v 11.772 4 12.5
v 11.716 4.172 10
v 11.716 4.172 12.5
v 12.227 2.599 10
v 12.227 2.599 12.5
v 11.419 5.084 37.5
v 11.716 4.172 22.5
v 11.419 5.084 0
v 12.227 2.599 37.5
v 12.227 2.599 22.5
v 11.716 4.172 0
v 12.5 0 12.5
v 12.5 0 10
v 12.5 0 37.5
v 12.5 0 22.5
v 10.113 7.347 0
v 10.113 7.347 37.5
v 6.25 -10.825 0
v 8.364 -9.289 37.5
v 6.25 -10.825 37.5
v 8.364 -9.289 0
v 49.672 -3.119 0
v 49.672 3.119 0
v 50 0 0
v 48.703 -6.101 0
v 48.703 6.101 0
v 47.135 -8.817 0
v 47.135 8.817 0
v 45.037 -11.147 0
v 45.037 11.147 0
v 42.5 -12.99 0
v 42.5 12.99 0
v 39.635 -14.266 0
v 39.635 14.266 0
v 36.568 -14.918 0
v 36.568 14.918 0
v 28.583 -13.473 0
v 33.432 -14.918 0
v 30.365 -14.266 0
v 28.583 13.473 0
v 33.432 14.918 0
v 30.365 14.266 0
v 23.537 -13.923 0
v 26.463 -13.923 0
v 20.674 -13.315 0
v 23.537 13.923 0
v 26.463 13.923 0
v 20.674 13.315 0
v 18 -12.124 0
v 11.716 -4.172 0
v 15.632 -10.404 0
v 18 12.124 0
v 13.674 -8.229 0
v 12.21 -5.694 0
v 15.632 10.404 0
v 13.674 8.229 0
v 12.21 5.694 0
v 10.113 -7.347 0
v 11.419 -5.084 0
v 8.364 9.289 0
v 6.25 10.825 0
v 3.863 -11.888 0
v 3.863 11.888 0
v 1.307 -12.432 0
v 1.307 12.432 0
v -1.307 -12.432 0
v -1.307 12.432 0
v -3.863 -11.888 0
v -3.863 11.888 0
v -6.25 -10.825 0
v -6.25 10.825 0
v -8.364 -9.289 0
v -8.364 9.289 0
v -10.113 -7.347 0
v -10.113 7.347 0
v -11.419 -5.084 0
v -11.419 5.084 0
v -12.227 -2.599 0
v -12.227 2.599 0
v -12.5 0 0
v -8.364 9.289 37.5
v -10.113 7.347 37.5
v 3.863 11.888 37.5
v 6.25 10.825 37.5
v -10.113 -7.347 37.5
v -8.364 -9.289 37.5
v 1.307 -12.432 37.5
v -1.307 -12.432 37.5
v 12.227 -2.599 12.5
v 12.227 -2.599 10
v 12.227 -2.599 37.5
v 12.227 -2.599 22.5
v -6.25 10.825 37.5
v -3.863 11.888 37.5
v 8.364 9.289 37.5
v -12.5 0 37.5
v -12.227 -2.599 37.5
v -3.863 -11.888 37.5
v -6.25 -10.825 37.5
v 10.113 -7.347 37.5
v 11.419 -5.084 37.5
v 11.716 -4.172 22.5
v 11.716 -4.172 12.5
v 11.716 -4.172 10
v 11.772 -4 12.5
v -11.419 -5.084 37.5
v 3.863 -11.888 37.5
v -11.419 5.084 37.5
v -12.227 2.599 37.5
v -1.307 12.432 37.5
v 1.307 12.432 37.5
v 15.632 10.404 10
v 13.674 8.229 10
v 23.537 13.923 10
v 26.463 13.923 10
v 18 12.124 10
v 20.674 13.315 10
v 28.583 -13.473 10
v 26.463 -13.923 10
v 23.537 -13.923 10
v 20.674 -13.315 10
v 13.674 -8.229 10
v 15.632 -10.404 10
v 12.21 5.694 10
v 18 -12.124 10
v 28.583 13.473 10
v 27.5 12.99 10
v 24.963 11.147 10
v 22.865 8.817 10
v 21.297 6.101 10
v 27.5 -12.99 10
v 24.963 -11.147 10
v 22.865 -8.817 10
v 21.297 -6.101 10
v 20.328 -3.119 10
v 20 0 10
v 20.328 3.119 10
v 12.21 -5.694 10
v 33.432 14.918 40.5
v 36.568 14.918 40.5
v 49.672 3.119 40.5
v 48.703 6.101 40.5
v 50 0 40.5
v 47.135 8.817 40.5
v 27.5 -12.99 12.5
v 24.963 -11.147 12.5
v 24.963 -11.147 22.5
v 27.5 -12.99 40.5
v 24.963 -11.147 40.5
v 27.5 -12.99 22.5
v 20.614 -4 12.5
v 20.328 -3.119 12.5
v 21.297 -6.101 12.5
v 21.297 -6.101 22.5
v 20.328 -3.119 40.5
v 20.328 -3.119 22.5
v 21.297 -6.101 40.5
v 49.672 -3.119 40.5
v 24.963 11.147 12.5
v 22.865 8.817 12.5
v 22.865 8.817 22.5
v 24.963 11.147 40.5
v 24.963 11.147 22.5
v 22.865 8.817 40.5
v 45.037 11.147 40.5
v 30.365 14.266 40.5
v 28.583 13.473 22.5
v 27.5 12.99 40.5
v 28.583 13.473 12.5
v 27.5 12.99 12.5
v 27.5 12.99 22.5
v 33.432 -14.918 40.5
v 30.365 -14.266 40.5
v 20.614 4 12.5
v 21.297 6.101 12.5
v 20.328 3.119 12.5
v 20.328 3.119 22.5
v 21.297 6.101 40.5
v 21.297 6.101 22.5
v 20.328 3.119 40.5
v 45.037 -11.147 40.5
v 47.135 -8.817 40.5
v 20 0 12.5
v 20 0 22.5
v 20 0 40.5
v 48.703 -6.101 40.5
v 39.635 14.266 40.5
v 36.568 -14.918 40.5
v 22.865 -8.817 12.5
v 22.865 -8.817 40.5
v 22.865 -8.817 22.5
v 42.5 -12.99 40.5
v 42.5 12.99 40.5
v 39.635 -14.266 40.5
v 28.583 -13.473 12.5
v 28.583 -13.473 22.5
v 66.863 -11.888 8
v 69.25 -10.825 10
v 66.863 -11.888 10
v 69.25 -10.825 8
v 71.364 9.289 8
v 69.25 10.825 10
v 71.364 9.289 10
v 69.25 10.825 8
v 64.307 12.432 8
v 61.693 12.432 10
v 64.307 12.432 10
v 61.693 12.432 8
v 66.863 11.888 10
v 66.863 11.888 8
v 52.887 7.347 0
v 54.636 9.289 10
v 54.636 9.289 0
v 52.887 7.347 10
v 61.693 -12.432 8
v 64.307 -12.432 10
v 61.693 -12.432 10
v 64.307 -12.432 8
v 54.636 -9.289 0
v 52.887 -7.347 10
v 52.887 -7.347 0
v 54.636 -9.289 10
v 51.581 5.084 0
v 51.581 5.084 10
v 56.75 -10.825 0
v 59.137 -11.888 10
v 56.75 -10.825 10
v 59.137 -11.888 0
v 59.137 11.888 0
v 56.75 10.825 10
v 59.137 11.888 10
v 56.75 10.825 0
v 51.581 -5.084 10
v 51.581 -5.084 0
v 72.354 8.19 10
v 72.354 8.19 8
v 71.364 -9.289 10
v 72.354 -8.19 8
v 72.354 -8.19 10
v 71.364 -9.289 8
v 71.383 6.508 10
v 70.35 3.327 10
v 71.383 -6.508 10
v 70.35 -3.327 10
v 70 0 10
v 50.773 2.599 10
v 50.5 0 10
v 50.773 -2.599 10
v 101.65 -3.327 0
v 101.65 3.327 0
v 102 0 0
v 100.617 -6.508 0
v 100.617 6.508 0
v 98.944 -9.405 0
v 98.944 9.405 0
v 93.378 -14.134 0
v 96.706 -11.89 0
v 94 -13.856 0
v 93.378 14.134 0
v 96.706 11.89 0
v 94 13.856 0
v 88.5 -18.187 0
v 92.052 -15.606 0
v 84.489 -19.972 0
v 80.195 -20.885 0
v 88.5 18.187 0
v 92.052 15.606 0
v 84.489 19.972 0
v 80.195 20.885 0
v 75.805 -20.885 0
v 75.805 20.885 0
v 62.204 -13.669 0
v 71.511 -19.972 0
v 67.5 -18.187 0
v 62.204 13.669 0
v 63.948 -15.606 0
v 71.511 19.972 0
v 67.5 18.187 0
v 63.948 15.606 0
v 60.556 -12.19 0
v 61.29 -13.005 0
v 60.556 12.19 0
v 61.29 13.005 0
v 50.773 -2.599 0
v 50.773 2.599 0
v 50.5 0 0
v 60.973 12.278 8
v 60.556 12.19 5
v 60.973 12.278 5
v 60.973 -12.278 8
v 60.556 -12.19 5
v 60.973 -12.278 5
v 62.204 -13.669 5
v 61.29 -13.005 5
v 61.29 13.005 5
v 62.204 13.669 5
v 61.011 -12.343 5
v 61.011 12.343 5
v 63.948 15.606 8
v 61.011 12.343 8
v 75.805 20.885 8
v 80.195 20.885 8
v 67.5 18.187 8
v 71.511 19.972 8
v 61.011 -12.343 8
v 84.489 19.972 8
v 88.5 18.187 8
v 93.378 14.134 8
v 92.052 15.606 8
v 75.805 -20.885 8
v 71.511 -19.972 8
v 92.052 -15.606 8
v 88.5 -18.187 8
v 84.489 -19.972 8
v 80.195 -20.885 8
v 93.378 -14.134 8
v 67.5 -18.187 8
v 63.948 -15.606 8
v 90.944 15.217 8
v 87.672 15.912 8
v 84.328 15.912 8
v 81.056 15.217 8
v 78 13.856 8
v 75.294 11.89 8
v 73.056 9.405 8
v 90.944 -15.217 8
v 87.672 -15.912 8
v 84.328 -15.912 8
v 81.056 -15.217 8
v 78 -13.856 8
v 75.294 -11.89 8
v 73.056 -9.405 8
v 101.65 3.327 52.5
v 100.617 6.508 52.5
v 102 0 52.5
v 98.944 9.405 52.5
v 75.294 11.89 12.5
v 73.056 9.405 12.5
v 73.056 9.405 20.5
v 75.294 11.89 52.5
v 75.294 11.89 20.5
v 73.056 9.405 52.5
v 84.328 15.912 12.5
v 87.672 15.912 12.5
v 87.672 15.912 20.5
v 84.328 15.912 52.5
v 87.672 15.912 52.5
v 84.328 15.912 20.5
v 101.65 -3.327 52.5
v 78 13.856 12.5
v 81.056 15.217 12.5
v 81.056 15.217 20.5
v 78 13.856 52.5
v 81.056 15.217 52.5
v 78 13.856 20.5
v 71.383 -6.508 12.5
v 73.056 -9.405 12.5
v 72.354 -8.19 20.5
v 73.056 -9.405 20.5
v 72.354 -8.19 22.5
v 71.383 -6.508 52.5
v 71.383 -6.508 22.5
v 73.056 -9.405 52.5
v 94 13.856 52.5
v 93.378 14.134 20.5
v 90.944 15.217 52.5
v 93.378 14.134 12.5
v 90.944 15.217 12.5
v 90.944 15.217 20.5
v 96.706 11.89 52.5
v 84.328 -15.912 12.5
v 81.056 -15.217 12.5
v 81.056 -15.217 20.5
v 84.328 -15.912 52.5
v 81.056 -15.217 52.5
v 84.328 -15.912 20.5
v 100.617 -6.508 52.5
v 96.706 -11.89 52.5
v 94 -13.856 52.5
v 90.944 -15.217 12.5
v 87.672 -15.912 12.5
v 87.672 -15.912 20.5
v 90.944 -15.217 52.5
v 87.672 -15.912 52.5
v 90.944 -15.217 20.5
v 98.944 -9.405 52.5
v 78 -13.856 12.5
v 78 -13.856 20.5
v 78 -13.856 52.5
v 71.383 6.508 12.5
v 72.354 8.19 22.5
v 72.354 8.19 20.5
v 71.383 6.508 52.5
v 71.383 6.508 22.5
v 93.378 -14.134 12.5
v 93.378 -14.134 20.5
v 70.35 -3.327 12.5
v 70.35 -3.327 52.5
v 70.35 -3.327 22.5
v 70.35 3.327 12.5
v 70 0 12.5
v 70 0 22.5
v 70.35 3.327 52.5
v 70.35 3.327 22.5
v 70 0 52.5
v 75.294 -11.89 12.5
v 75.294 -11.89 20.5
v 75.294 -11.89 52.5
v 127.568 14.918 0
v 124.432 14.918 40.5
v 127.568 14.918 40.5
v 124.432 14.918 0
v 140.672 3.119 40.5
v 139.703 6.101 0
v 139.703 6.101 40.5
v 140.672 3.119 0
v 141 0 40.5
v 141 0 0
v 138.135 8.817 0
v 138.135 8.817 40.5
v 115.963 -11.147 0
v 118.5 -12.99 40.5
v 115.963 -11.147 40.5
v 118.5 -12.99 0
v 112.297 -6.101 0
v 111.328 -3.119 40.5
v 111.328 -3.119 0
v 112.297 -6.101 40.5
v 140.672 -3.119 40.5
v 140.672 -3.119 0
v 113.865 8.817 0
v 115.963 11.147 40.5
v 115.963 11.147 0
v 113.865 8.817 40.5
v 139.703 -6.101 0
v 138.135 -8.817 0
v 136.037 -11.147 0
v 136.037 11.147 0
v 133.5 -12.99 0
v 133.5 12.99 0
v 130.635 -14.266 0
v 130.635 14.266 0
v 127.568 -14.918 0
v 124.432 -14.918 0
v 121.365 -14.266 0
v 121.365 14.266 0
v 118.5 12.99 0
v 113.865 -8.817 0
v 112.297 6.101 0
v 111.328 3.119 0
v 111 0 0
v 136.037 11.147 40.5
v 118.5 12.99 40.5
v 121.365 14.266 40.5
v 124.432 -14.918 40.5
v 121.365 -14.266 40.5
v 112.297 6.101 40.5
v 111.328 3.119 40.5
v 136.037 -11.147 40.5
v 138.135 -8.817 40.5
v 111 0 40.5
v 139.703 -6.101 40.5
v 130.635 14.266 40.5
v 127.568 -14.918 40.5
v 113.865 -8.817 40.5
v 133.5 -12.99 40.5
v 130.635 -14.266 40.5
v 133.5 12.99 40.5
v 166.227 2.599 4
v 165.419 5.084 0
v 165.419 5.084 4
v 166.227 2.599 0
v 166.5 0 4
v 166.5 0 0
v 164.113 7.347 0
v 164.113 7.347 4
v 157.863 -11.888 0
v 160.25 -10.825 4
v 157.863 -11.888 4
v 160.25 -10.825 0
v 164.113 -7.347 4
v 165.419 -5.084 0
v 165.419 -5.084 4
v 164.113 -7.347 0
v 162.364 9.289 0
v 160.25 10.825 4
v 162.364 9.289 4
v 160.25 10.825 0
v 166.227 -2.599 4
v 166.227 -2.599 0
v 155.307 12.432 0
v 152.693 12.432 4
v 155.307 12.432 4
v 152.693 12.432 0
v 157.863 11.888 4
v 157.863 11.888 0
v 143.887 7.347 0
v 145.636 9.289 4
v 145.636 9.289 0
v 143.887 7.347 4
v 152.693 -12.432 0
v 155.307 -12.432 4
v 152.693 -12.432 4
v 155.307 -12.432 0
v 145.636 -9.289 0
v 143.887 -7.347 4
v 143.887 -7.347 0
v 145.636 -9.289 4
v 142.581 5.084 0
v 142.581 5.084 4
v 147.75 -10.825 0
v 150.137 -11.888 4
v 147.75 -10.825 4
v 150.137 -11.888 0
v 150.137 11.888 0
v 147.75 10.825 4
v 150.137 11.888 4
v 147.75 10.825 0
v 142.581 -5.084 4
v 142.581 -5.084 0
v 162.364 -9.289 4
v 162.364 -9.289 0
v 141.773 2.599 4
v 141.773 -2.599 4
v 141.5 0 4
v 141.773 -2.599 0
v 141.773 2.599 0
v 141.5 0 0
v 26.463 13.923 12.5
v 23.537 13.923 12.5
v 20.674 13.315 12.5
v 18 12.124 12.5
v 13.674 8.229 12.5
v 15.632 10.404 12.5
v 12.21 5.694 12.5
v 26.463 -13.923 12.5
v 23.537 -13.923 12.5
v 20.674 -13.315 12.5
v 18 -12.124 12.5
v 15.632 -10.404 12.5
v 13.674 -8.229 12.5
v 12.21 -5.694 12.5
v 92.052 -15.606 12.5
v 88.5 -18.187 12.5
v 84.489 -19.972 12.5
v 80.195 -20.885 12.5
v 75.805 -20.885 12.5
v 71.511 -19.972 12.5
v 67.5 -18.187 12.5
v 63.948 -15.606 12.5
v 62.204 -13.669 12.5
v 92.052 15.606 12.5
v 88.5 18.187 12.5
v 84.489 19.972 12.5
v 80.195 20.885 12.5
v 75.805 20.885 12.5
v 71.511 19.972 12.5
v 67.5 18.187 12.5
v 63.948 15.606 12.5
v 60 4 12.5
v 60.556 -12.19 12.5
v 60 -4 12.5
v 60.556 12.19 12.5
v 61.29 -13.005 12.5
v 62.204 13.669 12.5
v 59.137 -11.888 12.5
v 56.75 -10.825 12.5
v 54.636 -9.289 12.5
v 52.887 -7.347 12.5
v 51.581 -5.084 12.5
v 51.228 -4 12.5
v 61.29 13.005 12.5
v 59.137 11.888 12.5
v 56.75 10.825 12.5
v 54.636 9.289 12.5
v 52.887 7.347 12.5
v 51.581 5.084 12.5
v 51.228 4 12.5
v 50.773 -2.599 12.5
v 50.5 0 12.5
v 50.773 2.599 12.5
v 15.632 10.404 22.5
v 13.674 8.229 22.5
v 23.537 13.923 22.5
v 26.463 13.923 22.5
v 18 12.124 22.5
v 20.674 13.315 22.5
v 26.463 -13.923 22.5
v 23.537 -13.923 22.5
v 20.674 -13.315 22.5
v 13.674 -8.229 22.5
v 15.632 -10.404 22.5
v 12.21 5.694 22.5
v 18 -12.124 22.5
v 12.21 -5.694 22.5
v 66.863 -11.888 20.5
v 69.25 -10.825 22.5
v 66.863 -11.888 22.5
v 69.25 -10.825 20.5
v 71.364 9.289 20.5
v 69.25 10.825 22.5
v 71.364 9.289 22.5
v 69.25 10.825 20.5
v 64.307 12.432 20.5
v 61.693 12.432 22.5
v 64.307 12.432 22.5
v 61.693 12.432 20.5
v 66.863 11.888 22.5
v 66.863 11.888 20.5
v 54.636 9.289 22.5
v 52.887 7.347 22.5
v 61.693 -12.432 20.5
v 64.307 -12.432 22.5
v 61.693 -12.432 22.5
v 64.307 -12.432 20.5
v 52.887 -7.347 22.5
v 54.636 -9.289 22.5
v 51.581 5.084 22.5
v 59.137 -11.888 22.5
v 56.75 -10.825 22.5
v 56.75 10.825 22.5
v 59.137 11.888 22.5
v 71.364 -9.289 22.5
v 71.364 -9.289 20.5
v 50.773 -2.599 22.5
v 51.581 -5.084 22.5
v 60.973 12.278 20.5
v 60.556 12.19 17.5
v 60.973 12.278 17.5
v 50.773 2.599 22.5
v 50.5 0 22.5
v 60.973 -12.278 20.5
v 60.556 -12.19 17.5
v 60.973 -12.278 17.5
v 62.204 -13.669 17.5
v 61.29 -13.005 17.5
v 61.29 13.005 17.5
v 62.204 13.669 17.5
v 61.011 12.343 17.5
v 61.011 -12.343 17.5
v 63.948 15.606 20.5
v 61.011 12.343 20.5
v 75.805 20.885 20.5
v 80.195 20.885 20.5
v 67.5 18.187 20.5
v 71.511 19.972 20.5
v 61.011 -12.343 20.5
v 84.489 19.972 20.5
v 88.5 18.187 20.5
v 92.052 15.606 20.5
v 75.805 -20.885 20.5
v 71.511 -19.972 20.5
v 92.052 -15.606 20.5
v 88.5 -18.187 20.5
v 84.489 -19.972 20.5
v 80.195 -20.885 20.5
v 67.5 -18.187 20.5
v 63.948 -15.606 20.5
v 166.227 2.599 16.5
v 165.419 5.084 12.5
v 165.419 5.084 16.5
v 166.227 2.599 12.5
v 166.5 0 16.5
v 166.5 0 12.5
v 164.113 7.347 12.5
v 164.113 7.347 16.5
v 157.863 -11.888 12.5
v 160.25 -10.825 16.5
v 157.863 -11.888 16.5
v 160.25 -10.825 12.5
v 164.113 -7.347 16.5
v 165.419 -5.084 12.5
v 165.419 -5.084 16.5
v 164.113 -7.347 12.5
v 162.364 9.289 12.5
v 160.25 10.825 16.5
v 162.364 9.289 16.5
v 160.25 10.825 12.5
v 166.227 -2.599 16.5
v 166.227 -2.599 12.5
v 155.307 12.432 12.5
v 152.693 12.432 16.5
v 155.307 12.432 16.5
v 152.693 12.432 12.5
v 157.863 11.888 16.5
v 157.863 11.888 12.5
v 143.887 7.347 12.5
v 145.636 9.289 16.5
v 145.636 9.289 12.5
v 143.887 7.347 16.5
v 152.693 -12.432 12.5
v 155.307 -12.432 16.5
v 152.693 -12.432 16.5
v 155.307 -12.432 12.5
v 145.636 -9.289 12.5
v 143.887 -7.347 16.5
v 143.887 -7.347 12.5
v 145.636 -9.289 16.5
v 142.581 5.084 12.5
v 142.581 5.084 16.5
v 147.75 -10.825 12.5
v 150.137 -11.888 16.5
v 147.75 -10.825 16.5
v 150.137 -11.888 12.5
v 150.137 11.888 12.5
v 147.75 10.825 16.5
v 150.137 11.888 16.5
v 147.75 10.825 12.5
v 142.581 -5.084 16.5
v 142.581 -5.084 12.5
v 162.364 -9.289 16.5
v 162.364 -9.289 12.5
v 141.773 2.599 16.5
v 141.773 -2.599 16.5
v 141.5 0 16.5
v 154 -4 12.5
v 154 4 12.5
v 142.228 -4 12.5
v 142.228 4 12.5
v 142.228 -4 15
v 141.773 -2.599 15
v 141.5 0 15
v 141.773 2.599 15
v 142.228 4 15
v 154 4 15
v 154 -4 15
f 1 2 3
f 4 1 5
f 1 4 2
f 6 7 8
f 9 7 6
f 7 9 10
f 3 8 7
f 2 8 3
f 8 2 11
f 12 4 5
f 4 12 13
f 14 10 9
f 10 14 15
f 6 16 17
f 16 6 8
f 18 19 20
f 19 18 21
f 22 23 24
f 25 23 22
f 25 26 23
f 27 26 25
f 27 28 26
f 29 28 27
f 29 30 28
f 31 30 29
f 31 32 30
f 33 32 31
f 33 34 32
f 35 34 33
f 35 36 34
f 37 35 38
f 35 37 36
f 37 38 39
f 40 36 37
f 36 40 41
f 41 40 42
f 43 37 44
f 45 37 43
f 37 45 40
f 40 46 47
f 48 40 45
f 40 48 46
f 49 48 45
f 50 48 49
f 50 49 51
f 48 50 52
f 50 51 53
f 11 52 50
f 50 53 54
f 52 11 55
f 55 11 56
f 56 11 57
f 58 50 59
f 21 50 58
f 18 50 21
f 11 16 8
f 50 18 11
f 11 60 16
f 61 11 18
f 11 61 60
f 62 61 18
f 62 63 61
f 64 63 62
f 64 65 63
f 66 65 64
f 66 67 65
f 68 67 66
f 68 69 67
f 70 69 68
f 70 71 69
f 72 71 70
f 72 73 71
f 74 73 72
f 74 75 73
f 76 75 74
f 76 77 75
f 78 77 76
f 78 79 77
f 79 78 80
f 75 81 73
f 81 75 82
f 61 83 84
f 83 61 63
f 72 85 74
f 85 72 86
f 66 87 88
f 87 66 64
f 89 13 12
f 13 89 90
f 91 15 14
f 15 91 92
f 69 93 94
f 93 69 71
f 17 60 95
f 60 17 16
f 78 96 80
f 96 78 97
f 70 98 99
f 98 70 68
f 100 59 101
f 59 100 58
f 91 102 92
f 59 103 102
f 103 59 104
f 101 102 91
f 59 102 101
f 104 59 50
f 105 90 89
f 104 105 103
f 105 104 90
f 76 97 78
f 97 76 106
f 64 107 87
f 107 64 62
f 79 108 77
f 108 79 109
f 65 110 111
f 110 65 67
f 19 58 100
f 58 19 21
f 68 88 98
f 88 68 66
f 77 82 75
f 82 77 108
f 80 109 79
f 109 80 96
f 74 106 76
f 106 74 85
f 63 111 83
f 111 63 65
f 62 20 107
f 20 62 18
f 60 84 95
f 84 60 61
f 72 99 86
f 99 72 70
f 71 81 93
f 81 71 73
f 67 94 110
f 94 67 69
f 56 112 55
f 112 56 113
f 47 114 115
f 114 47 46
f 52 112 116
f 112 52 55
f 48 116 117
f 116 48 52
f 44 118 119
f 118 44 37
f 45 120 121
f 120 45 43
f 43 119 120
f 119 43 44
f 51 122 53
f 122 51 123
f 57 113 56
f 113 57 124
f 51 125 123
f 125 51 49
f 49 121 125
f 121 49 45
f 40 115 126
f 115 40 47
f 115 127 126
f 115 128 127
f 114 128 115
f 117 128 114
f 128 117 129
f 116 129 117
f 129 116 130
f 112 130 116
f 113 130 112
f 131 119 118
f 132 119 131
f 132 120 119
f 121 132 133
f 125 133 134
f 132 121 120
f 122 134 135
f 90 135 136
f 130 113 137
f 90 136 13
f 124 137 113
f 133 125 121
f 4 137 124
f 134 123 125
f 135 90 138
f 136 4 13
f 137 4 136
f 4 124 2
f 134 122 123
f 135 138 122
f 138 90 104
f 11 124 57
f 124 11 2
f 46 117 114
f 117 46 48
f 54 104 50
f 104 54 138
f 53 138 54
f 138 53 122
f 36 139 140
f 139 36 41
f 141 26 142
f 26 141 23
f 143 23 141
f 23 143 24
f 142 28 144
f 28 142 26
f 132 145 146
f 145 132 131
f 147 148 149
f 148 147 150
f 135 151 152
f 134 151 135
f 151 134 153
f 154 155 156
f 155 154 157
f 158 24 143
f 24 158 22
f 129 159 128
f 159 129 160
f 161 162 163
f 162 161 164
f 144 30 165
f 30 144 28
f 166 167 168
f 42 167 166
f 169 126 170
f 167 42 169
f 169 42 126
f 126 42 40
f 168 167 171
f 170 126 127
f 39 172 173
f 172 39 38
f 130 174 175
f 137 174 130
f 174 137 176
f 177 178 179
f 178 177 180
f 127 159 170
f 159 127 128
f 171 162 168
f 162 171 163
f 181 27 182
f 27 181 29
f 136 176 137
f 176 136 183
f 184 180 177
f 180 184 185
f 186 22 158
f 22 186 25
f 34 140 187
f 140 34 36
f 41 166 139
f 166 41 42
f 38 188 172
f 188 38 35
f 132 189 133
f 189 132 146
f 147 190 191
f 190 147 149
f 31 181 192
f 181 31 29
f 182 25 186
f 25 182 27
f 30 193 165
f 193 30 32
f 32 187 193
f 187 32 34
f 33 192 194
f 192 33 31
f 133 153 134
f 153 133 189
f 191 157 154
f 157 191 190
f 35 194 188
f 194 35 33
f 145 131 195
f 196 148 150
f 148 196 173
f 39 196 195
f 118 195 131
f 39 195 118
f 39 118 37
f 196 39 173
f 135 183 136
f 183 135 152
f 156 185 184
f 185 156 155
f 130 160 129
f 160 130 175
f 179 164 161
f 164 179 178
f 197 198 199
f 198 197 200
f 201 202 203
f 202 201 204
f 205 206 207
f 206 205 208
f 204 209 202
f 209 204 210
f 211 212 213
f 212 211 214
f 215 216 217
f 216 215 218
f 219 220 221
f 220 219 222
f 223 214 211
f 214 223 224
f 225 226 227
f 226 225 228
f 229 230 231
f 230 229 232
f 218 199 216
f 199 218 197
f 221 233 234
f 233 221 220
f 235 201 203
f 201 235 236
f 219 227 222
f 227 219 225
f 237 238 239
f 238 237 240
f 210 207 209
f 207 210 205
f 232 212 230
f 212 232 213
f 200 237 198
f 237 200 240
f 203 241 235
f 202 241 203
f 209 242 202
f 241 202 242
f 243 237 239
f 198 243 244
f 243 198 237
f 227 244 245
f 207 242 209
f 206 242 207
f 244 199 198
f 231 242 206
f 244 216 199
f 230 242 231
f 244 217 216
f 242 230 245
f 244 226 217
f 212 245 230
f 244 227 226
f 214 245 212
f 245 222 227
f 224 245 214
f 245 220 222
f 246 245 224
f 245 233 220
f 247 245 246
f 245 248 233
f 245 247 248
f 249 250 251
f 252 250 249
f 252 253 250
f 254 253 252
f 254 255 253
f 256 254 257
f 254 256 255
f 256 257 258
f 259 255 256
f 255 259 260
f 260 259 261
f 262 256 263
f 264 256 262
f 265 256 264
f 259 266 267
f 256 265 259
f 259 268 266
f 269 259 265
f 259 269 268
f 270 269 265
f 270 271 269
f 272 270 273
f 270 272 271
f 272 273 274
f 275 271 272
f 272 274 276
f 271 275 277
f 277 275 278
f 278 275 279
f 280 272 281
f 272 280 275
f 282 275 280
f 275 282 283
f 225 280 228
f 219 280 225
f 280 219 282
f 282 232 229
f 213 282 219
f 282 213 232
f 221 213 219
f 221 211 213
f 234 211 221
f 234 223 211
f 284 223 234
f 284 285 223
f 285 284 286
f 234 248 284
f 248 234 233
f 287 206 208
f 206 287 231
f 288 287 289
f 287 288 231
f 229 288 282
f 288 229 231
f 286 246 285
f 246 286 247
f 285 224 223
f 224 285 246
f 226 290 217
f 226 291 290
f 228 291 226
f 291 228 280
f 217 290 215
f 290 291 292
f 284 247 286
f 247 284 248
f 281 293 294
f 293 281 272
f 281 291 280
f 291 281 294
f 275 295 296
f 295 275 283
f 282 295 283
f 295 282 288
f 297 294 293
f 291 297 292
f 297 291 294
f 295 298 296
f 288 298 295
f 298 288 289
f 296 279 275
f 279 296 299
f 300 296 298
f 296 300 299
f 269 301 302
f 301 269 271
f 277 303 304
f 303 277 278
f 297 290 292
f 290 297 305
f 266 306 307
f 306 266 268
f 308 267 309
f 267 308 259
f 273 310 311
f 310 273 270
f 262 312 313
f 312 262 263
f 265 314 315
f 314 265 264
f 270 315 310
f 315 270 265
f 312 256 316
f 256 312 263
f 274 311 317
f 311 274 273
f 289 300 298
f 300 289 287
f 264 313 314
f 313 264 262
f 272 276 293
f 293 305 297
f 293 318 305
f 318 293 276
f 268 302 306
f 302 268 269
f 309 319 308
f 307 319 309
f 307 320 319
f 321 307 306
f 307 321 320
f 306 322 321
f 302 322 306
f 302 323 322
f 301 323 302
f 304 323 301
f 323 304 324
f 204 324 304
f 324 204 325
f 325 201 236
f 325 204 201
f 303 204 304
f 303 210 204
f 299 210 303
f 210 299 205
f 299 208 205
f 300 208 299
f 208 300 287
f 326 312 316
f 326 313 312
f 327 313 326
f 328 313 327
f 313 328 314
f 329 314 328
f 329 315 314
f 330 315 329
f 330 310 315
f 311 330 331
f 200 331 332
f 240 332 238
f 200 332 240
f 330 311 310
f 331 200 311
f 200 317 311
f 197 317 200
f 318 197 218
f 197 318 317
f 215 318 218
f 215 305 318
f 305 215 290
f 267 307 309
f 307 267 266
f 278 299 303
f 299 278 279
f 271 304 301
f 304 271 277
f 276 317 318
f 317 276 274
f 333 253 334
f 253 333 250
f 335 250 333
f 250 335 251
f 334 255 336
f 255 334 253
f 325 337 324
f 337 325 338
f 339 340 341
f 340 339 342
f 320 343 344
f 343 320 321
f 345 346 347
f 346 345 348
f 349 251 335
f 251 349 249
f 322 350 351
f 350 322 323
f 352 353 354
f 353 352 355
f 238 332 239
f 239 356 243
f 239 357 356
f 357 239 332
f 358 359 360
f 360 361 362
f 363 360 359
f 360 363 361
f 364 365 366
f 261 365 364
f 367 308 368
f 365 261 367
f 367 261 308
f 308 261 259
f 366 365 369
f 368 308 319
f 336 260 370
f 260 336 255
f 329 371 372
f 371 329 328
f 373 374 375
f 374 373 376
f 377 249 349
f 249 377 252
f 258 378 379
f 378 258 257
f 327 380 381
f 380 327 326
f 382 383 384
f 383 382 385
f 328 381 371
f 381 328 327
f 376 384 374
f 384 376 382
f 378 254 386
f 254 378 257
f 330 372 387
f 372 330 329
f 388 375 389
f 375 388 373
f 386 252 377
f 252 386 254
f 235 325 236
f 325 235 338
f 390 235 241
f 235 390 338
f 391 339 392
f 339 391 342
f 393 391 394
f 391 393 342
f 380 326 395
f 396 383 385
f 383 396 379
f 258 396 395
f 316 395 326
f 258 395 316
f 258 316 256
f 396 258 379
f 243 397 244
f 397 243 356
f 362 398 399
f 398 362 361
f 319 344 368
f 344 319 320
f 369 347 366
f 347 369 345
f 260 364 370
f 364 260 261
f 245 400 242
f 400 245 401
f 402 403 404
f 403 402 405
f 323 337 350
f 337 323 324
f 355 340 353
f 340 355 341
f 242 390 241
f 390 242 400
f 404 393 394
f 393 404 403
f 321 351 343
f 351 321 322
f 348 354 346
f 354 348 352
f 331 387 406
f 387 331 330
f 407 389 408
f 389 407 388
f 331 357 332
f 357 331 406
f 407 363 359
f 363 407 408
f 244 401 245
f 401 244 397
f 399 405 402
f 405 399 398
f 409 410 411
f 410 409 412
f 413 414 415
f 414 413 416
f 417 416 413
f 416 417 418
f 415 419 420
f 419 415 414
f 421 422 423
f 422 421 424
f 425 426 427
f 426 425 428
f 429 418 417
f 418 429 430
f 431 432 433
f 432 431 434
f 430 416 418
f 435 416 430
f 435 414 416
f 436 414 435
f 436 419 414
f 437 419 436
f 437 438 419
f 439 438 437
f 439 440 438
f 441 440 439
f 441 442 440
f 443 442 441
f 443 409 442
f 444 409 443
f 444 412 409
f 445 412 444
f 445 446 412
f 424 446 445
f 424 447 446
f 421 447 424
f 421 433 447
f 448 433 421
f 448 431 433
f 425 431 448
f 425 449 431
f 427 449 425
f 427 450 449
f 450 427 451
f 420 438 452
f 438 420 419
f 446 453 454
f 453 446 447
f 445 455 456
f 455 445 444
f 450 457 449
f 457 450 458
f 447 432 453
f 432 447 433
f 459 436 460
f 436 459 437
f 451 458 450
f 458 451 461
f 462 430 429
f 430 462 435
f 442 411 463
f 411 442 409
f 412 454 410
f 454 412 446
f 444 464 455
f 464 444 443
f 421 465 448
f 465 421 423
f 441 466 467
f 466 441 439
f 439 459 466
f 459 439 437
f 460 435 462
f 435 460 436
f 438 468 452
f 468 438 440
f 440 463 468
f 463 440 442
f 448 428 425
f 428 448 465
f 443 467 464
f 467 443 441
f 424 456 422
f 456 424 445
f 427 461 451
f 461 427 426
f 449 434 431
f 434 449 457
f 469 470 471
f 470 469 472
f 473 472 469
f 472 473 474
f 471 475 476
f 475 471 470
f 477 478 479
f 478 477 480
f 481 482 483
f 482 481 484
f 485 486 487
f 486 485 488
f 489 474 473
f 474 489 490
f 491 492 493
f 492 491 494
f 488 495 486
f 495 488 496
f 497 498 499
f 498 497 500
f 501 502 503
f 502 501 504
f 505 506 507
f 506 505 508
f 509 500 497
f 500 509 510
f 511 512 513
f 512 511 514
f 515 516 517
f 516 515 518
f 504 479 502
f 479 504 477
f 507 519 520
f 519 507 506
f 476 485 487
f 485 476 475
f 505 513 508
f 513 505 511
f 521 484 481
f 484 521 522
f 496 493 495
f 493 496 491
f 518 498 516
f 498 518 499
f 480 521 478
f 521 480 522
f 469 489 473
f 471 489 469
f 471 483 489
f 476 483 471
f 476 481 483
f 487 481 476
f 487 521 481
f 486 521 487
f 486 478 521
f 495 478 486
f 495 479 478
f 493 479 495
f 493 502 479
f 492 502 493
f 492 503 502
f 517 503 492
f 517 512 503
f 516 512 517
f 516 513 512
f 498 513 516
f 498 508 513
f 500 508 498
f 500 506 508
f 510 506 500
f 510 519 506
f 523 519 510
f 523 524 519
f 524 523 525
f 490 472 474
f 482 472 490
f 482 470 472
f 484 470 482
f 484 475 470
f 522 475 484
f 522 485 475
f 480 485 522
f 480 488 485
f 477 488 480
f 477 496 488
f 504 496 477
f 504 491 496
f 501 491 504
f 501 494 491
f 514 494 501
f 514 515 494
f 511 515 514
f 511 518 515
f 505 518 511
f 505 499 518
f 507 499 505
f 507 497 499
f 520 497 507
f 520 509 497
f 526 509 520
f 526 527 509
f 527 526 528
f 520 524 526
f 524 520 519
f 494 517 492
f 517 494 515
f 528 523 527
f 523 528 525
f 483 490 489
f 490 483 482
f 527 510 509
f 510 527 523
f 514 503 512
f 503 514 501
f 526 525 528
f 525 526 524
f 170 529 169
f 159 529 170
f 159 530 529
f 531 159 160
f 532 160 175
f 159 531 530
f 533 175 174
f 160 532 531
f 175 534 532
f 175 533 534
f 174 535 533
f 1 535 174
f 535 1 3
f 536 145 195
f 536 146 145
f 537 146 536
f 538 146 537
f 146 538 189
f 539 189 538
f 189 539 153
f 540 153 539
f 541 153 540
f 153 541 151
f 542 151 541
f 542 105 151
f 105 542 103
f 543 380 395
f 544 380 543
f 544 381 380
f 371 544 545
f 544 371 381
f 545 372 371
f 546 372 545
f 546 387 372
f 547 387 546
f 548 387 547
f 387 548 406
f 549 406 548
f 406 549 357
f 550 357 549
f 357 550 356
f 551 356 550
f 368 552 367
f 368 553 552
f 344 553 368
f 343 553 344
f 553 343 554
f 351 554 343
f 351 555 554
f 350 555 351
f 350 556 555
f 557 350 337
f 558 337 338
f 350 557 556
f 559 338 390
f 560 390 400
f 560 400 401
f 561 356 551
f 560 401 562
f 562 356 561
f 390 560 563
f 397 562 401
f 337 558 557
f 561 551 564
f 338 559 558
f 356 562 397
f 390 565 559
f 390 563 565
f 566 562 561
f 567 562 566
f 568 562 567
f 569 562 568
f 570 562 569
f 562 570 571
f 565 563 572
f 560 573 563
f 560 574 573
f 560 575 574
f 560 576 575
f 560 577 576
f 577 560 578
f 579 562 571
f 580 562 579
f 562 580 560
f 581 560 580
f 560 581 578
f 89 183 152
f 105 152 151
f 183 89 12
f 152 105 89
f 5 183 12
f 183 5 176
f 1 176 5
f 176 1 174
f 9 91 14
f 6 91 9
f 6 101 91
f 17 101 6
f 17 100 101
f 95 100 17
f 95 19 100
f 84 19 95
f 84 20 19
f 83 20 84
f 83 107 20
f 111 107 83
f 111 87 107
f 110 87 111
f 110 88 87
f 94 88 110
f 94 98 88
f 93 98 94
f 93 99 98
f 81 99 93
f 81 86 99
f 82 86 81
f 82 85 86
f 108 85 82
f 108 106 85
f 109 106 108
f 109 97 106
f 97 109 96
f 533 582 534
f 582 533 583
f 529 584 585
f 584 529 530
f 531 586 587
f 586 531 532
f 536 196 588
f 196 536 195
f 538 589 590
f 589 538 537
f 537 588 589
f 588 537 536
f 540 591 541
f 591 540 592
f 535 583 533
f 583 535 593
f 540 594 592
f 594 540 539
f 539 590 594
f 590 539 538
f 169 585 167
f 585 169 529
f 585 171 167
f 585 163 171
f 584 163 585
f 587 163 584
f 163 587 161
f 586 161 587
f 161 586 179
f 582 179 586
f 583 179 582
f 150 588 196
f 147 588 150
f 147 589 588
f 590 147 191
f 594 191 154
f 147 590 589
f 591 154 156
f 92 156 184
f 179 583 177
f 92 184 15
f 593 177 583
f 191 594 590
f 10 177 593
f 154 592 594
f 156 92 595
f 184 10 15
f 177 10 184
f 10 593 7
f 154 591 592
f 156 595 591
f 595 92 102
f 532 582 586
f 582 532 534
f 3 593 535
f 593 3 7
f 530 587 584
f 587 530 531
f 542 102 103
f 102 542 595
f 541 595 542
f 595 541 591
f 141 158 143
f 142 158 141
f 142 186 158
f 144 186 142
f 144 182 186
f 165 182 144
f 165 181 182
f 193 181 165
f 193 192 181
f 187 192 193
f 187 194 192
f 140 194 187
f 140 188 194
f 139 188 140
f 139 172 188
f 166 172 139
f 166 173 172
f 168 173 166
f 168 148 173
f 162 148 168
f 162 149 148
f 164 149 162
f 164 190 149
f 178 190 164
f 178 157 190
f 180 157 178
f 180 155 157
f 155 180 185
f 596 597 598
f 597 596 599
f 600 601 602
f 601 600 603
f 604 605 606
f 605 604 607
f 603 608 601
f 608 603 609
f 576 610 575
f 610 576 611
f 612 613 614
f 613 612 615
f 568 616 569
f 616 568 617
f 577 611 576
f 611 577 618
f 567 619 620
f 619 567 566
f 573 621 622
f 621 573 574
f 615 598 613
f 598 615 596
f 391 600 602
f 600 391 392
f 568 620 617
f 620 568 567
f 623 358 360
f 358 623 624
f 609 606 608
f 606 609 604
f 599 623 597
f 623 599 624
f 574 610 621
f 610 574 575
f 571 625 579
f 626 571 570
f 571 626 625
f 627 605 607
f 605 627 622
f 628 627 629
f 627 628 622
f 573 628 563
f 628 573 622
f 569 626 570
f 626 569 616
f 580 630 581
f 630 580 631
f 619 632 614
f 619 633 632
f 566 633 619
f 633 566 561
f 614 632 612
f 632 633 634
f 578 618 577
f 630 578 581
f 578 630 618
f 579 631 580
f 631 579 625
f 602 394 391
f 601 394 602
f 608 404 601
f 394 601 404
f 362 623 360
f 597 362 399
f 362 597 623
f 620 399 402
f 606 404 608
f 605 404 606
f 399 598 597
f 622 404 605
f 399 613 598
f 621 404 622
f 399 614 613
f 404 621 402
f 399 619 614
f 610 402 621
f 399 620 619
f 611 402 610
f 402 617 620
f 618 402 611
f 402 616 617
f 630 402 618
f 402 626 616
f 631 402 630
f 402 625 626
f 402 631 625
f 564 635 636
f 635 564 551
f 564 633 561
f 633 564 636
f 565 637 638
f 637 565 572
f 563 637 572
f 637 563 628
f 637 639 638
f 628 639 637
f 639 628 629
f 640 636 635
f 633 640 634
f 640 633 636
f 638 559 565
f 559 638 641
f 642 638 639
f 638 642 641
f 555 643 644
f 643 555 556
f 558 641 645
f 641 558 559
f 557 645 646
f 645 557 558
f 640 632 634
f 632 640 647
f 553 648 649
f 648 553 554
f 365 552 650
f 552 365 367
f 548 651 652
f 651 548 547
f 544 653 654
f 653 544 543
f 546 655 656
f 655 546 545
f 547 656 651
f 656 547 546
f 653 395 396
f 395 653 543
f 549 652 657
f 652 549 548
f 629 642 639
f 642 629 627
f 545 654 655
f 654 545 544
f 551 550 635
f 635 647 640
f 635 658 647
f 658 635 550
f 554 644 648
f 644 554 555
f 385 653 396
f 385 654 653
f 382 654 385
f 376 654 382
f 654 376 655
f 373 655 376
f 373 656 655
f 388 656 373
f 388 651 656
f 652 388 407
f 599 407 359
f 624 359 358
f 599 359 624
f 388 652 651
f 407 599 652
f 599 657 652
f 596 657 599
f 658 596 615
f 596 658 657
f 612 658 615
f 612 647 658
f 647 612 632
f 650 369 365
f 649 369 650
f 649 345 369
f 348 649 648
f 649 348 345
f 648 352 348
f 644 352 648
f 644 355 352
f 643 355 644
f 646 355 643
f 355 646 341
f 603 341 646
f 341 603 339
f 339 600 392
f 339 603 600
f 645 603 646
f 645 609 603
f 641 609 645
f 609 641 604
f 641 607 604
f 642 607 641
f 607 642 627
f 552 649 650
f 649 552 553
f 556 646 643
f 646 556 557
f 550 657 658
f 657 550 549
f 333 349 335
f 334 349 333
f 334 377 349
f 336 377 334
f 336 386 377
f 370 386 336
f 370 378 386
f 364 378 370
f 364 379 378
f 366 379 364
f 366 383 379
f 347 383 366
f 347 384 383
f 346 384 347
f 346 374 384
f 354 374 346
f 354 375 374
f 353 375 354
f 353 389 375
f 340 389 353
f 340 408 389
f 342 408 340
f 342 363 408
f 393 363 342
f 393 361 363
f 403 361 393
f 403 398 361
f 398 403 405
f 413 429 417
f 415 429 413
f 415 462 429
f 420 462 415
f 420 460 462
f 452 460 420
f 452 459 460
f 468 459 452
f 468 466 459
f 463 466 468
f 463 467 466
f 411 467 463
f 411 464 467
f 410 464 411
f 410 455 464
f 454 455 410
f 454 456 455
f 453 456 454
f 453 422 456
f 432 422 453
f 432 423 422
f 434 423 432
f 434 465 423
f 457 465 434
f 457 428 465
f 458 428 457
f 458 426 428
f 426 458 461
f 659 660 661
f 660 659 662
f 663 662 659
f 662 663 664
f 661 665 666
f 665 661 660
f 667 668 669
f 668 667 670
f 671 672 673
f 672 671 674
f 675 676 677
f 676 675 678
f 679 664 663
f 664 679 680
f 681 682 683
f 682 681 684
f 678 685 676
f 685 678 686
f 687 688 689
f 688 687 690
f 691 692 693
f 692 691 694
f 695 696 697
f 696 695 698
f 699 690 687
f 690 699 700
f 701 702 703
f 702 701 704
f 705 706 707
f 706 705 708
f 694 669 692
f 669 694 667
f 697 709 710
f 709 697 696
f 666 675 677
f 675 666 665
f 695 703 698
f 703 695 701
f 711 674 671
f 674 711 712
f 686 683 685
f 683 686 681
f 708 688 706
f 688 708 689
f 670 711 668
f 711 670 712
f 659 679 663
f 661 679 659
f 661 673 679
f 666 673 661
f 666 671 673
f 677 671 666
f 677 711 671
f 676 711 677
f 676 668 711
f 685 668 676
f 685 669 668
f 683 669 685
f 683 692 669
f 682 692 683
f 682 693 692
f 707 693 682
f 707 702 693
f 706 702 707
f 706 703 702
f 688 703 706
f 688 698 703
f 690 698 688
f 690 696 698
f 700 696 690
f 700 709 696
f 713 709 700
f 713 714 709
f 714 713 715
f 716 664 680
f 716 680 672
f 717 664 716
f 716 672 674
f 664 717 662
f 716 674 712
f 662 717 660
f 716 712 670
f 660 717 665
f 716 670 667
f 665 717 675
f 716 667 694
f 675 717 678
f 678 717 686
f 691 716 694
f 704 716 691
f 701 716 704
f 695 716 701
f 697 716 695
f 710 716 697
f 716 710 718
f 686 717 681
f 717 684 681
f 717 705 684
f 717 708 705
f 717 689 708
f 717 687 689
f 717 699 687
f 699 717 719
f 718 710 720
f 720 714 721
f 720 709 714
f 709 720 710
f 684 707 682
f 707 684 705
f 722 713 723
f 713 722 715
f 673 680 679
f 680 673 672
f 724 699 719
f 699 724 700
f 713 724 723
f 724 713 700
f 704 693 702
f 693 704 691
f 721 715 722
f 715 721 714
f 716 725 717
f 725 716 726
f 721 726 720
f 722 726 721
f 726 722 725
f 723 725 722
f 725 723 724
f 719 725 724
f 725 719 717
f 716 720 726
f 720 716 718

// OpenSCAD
// 阶梯轴 Stepped Shaft - OpenSCAD 代码
// 基于工程图纸生成三维模型
//
// 图纸分析:
// - 总长度: 158mm
// - 各段直径: Ø25, Ø28, Ø30, Ø35, Ø42, Ø32
// - 键槽: 左端平键槽(8x4x50), 中部半圆键槽(R14), 右端方键槽(8x8)
// - 投影法: 第三视角

// ====================
// 参数定义
// ====================

// 各段长度 (从左到右)
segment1_len = 25;   // Ø25
segment2_len = 10;   // Ø28
segment3_len = 28;   // Ø30
segment4_len = 10;   // Ø25 (回退)
segment5_len = 5;    // Ø35 法兰
segment6_len = 8;    // Ø42 法兰
segment7_len = 40;   // Ø32 半圆键槽处
segment8_len = 28;   // Ø30
segment9_len = 4;    // Ø25 收尾

// 各段直径
d1 = 25;
d2 = 28;
d3 = 30;
d4 = 25;
d5 = 35;
d6 = 42;
d7 = 32;
d8 = 30;
d9 = 25;

// 键槽参数
keyway1_width = 8;   // 左端平键槽
keyway1_depth = 4;
keyway1_length = 50;

keyway2_radius = 14; // 半圆键槽半径
keyway2_width = 8;

keyway3_width = 8;   // 右端方键槽
keyway3_depth = 8;
keyway3_length = 28;

// ====================
// 模块定义
// ====================

// 圆柱段模块
module cylinder_segment(diameter, length) {
    cylinder(h=length, d=diameter, center=false);
}

// 键槽切除模块
module keyway_cut(width, depth, length, height_offset) {
    translate([0, -width/2, height_offset])
        cube([length, width, depth]);
}

// ====================
// 生成模型
// ====================

// 总长度
total_length = segment1_len + segment2_len + segment3_len + segment4_len + 
               segment5_len + segment6_len + segment7_len + segment8_len + segment9_len;

echo("总长度 = ", total_length, "mm");

// 构建阶梯轴主体
union() {
    // 第1段 Ø25
    translate([0, 0, 0])
        cylinder_segment(d1, segment1_len);
    
    // 第2段 Ø28
    translate([segment1_len, 0, 0])
        cylinder_segment(d2, segment2_len);
    
    // 第3段 Ø30
    translate([segment1_len + segment2_len, 0, 0])
        cylinder_segment(d3, segment3_len);
    
    // 第4段回退 Ø25
    translate([segment1_len + segment2_len + segment3_len, 0, 0])
        cylinder_segment(d4, segment4_len);
    
    // 第5段法兰小径 Ø35
    translate([segment1_len + segment2_len + segment3_len + segment4_len, 0, 0])
        cylinder_segment(d5, segment5_len);
    
    // 第6段法兰大径 Ø42
    translate([segment1_len + segment2_len + segment3_len + segment4_len + segment5_len, 0, 0])
        cylinder_segment(d6, segment6_len);
    
    // 第7段半圆键槽处 Ø32
    translate([segment1_len + segment2_len + segment3_len + segment4_len + segment5_len + segment6_len, 0, 0])
        cylinder_segment(d7, segment7_len);
    
    // 第8段右端 Ø30
    translate([segment1_len + segment2_len + segment3_len + segment4_len + segment5_len + segment6_len + segment7_len, 0, 0])
        cylinder_segment(d8, segment8_len);
    
    // 第9段收尾 Ø25
    translate([segment1_len + segment2_len + segment3_len + segment4_len + segment5_len + segment6_len + segment7_len + segment8_len, 0, 0])
        cylinder_segment(d9, segment9_len);
}

// 切除键槽
difference() {
    // 整体向上偏移，使轴心在 z=0
    translate([0, 0, 12.5])
    union() {
        // 第1段 Ø25
        translate([0, 0, 0])
            cylinder_segment(d1, segment1_len);
        
        // 第2段 Ø28
        translate([segment1_len, 0, 0])
            cylinder_segment(d2, segment2_len);
        
        // 第3段 Ø30
        translate([segment1_len + segment2_len, 0, 0])
            cylinder_segment(d3, segment3_len);
        
        // 第4段回退 Ø25
        translate([segment1_len + segment2_len + segment3_len, 0, 0])
            cylinder_segment(d4, segment4_len);
        
        // 第5段法兰小径 Ø35
        translate([segment1_len + segment2_len + segment3_len + segment4_len, 0, 0])
            cylinder_segment(d5, segment5_len);
        
        // 第6段法兰大径 Ø42
        translate([segment1_len + segment2_len + segment3_len + segment4_len + segment5_len, 0, 0])
            cylinder_segment(d6, segment6_len);
        
        // 第7段半圆键槽处 Ø32
        translate([segment1_len + segment2_len + segment3_len + segment4_len + segment5_len + segment6_len, 0, 0])
            cylinder_segment(d7, segment7_len);
        
        // 第8段右端 Ø30
        translate([segment1_len + segment2_len + segment3_len + segment4_len + segment5_len + segment6_len + segment7_len, 0, 0])
            cylinder_segment(d8, segment8_len);
        
        // 第9段收尾 Ø25
        translate([segment1_len + segment2_len + segment3_len + segment4_len + segment5_len + segment6_len + segment7_len + segment8_len, 0, 0])
            cylinder_segment(d9, segment9_len);
    }
    
    // 左端平键槽切除 (位于第1段末端)
    // 位置: 从左端25+10=35mm处开始
    keyway1_x = segment1_len + 10;
    translate([keyway1_x - keyway1_length/2, -keyway1_width/2, 12.5 - keyway1_depth])
        cube([keyway1_length, keyway1_width, keyway1_depth]);
    
    // 中部半圆键槽 (Woodruff keyway R14)
    // 位于法兰右侧的Ø32段
    keyway2_x = segment1_len + segment2_len + segment3_len + segment4_len + segment5_len + segment6_len + 16;
    translate([keyway2_x - keyway2_width/2, 12.5 - keyway2_radius, 12.5 - keyway2_radius])
        cylinder(h=keyway2_width, r=keyway2_radius);
    
    // 右端方键槽
    // 位于右端Ø30段
    keyway3_x = segment1_len + segment2_len + segment3_len + segment4_len + segment5_len + segment6_len + segment7_len + 14;
    translate([keyway3_x - keyway3_length/2, -keyway3_width/2, 15 - keyway3_depth])
        cube([keyway3_length, keyway3_width, keyway3_depth]);
}

// ====================
// 渲染设置
// ====================

// $fn = 100; // 圆周分段数（平滑度）
